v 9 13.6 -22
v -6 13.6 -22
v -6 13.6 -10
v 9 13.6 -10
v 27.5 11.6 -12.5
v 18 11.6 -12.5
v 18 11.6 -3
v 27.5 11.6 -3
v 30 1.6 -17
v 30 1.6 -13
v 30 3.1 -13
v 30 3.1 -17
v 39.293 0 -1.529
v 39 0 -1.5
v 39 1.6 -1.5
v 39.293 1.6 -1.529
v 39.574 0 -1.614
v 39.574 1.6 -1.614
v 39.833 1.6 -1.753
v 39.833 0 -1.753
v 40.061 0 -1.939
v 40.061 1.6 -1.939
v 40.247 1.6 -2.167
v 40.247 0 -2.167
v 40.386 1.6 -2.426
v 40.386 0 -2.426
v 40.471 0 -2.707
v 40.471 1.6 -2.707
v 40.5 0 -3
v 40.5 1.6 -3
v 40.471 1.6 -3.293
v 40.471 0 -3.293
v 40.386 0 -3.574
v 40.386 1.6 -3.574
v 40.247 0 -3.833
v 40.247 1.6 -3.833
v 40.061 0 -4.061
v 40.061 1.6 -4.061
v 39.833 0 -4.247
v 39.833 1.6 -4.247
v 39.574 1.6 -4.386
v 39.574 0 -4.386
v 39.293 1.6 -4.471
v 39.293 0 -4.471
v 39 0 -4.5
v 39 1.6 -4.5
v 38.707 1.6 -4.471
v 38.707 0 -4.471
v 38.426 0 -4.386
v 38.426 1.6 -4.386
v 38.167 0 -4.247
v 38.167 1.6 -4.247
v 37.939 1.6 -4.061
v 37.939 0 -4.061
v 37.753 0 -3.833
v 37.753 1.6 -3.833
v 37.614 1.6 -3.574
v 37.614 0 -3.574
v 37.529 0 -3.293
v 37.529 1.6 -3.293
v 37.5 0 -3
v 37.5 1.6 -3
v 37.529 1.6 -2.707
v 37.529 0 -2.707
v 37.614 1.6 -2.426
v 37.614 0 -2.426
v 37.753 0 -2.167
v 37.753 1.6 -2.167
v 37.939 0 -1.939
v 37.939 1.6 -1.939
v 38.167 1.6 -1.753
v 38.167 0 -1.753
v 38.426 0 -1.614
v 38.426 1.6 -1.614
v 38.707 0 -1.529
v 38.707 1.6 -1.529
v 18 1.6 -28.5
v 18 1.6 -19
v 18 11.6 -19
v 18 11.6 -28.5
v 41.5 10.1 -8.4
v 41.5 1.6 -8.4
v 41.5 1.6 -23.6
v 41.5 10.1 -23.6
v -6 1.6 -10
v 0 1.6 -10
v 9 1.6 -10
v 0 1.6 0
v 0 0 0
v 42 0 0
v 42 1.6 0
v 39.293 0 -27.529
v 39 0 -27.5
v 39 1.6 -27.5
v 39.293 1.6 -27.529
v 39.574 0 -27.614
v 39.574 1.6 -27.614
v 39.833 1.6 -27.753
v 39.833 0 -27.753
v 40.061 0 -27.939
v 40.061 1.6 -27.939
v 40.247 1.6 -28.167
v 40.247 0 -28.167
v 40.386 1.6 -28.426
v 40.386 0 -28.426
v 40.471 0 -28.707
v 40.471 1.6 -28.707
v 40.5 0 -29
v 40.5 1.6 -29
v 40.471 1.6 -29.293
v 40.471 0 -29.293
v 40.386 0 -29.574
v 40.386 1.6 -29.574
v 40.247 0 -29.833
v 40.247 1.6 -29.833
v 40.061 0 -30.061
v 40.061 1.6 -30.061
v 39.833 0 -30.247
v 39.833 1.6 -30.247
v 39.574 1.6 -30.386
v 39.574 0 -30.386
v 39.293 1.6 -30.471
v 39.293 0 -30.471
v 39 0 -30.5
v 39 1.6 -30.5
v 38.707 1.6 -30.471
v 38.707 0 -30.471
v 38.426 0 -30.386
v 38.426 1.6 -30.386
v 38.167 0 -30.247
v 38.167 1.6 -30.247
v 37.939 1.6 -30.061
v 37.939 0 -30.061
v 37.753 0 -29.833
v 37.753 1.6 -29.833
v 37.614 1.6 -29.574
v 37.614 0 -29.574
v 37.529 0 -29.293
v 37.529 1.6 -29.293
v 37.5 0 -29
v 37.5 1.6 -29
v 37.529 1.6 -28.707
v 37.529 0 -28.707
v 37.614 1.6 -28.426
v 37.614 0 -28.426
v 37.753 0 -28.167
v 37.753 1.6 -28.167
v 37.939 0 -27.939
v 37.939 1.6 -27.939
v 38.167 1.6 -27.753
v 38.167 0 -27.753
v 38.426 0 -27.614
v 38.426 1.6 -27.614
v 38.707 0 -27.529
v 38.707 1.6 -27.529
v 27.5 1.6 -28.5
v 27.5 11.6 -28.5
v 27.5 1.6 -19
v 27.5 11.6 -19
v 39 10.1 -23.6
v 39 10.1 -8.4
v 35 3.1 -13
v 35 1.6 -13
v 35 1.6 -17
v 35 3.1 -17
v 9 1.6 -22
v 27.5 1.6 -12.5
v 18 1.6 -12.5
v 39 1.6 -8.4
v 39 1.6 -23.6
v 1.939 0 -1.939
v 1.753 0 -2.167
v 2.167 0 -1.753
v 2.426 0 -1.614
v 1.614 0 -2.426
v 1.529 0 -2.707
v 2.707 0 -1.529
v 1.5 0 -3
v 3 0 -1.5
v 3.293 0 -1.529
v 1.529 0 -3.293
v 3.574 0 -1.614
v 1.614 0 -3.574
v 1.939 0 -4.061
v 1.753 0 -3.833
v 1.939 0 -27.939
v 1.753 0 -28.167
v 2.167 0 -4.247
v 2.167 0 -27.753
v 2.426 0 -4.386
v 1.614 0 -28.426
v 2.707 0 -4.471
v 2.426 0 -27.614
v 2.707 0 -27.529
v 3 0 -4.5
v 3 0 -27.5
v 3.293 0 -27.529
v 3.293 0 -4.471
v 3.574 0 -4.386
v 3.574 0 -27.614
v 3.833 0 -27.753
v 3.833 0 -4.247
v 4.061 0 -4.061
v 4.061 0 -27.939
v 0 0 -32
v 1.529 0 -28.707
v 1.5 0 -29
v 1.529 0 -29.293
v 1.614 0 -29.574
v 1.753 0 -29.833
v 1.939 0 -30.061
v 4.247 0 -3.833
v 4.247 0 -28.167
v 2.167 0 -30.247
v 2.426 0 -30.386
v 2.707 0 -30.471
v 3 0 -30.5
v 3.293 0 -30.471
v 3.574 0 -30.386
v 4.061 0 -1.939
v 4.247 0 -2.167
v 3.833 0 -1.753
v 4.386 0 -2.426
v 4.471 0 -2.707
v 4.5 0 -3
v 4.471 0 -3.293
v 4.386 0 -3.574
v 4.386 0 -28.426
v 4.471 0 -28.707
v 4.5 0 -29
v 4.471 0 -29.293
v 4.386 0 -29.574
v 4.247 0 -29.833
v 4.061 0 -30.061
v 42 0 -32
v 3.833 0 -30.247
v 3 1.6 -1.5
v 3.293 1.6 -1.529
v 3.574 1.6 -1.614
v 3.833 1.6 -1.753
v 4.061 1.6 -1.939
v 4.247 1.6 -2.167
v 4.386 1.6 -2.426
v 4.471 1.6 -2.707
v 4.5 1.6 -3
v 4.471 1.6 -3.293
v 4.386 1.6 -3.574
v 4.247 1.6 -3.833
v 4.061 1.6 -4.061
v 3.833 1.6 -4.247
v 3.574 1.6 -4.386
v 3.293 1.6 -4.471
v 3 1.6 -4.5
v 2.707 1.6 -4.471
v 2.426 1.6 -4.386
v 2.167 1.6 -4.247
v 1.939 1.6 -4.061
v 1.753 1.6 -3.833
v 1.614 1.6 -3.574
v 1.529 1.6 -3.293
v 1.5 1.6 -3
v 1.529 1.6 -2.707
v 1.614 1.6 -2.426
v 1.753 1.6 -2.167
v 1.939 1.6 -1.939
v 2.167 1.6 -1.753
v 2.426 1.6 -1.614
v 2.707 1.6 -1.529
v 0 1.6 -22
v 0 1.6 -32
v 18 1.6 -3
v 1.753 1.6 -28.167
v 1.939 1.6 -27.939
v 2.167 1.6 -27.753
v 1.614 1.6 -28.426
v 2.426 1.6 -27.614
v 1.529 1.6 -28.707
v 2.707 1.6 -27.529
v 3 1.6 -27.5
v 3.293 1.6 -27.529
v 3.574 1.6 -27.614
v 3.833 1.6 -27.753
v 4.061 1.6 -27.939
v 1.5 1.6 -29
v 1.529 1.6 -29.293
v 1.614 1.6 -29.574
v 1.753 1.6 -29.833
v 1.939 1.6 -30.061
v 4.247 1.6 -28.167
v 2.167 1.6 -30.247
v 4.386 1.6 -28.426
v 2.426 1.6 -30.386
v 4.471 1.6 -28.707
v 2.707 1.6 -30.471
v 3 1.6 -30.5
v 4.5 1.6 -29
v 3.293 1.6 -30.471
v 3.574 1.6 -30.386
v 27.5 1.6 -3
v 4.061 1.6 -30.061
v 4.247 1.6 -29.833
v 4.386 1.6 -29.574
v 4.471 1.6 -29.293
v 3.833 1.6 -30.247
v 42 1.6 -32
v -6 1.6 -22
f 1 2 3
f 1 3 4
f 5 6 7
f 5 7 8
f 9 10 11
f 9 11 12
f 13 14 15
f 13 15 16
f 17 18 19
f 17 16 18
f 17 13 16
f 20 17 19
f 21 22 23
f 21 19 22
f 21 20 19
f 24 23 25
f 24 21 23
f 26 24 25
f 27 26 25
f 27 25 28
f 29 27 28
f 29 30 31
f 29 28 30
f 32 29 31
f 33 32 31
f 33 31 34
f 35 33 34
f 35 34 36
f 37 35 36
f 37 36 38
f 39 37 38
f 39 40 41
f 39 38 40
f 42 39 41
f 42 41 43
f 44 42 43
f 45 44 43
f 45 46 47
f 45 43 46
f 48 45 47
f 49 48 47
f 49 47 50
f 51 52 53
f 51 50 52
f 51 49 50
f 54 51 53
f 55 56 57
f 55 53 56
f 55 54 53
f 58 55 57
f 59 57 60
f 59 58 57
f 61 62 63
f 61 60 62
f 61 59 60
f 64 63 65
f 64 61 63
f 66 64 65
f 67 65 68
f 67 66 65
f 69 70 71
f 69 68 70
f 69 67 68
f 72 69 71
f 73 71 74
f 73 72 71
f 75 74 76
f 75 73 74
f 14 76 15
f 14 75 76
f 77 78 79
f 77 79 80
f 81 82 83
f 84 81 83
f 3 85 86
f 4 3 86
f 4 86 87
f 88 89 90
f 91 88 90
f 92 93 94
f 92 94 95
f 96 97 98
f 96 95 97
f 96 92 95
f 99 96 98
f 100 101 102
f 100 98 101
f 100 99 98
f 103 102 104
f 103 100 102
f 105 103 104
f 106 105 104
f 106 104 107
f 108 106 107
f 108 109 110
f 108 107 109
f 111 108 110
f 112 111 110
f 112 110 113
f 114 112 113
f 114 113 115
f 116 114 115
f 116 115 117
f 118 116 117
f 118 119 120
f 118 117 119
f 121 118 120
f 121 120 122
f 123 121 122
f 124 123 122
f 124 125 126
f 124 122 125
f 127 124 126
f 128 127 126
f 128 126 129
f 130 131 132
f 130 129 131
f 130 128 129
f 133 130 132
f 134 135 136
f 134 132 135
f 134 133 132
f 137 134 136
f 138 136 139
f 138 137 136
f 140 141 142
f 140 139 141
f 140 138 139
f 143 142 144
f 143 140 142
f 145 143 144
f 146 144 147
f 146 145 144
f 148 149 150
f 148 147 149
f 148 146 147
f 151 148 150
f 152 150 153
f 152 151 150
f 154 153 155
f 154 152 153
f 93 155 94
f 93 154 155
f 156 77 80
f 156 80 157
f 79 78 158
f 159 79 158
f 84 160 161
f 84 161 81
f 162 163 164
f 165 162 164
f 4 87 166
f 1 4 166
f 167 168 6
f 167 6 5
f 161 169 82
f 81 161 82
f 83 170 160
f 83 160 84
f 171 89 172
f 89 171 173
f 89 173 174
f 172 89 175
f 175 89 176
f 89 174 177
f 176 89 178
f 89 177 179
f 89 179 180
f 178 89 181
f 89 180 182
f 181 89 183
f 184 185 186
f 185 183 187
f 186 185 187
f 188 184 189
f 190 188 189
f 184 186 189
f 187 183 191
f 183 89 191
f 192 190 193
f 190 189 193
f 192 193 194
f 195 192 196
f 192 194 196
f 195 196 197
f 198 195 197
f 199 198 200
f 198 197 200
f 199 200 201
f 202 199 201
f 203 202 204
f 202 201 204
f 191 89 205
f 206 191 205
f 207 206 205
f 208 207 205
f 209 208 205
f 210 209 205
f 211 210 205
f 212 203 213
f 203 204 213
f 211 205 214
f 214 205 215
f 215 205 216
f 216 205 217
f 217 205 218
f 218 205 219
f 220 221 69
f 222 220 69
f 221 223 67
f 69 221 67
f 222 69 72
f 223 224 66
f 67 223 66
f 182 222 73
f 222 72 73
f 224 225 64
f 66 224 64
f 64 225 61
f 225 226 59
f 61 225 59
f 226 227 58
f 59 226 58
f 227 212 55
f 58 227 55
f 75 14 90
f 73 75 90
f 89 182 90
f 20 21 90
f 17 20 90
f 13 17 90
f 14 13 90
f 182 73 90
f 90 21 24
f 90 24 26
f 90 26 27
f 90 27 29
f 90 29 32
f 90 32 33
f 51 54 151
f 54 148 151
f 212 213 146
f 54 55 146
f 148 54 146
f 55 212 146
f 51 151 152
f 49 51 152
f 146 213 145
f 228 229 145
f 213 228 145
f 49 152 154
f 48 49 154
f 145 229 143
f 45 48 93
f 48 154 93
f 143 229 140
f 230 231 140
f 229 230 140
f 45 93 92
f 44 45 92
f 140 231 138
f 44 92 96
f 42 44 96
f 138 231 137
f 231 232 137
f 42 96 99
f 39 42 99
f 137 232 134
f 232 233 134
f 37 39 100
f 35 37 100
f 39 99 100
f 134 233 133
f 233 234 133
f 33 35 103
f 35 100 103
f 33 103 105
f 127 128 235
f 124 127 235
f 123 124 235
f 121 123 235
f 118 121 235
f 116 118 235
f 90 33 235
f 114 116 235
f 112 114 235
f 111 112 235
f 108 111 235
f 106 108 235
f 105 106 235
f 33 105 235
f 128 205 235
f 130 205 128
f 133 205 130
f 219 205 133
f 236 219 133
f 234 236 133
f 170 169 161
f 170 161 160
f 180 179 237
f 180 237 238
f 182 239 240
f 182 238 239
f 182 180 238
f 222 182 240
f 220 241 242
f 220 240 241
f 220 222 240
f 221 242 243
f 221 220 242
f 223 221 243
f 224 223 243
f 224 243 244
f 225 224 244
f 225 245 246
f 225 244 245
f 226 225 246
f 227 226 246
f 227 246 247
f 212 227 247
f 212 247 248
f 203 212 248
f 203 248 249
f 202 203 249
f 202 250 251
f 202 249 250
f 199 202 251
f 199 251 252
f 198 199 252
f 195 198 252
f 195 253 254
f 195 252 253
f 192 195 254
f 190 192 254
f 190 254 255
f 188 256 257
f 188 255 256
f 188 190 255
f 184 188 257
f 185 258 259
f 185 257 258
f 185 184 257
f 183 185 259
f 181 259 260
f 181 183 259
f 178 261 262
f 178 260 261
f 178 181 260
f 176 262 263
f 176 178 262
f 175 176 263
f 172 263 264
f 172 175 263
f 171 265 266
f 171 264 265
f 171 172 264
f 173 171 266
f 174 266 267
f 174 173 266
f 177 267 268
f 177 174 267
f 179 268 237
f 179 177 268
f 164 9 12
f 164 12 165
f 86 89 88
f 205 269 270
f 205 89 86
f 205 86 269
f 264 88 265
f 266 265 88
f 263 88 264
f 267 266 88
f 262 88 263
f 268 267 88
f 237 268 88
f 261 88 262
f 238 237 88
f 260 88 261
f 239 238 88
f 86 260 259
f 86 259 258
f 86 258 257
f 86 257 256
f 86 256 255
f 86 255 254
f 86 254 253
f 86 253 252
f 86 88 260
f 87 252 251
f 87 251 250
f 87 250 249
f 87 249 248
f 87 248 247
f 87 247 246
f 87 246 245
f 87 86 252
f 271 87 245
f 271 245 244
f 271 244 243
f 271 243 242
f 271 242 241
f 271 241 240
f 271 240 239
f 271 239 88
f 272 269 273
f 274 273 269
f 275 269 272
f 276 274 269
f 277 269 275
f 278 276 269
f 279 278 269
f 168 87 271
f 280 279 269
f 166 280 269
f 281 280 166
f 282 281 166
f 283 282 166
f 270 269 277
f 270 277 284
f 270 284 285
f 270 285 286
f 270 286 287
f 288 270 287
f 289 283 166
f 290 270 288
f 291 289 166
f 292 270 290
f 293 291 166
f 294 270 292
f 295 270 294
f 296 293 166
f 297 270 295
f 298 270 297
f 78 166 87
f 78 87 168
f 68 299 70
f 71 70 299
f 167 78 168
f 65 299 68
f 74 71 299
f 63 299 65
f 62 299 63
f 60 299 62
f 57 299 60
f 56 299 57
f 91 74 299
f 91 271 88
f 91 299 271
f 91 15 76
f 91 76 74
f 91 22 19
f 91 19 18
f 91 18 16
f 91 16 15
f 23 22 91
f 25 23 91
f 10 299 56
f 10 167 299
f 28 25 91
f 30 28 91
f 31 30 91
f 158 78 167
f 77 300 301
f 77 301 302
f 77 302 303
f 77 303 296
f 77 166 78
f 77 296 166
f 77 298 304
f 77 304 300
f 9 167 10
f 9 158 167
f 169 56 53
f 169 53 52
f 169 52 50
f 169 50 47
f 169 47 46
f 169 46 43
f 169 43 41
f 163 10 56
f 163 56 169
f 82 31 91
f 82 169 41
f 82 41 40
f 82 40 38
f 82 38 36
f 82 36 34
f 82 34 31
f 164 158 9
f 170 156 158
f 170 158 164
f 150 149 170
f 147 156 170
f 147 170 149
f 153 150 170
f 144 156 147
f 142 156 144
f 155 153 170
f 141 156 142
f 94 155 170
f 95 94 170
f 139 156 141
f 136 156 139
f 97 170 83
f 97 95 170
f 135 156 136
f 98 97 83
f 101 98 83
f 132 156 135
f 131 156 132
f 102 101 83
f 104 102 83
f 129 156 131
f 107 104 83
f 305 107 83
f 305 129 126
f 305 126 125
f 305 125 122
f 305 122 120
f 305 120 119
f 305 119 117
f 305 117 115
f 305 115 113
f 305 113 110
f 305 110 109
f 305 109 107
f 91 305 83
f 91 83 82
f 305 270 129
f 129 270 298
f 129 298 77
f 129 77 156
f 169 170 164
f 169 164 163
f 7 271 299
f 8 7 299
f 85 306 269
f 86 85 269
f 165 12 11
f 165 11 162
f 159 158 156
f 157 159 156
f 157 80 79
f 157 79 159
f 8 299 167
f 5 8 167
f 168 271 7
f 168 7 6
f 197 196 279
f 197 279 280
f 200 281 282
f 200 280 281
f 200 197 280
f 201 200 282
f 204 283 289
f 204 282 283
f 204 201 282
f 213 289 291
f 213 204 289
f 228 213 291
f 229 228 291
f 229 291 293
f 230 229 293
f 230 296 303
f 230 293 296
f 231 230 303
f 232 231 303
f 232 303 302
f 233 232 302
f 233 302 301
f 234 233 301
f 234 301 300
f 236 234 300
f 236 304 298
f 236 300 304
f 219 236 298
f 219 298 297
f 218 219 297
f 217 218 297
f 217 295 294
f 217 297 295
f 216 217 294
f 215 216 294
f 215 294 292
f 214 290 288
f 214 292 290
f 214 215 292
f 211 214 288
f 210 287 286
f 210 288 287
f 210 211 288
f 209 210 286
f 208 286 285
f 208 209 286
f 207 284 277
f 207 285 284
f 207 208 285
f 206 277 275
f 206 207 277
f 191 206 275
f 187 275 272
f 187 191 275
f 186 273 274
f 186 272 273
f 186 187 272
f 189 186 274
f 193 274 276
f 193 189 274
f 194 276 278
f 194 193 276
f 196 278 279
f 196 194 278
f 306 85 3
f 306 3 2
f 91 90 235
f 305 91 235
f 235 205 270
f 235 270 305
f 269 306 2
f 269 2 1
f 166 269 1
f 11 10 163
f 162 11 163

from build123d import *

# Parameters (mm, degrees)
SKETCH1_W               = 42
SKETCH1_H               = 32
PCB_DEPTH               = 1.6
MOUNT_HOLE_1_DEPTH      = 53.825751296
MOUNT_HOLE_1_DEPTH_BACK = 53.825751296
SKETCH2_R               = 1.5
MOUNT_HOLE_2_DEPTH      = 53.825751296
MOUNT_HOLE_2_DEPTH_BACK = 53.825751296
SKETCH3_R               = 1.5
MOUNT_HOLE_3_DEPTH      = 53.825751296
MOUNT_HOLE_3_DEPTH_BACK = 53.825751296
SKETCH4_R               = 1.5
MOUNT_HOLE_4_DEPTH      = 53.825751296
MOUNT_HOLE_4_DEPTH_BACK = 53.825751296
SKETCH5_R               = 1.5
BNC_SOCKET_START        = 1.6
SKETCH6_W               = 15
SKETCH6_H               = 12
BNC_SOCKET_DEPTH        = 12
OFFSET_POT_START        = 1.6
SKETCH7_W               = 9.5
SKETCH7_H               = 9.5
OFFSET_POT_DEPTH        = 10
LIMIT_POT_START         = 1.6
SKETCH8_W               = 9.5
SKETCH8_H               = 9.5
LIMIT_POT_DEPTH         = 10
OP_AMP_START            = 1.6
SKETCH9_W               = 5
SKETCH9_H               = 4
OP_AMP_DEPTH            = 1.5
HEADER_6PIN_START       = 1.6
SKETCH10_W              = 2.5
SKETCH10_H              = 15.2
HEADER_6PIN_DEPTH       = 8.5


with BuildPart() as part:
    # Sketch1 → PCB (new body)
    with BuildSketch(Plane(origin=(0, 0, 0), x_dir=(1, 0, 0), z_dir=(0, 1, 0))):
        with Locations((21, 16)):
            Rectangle(SKETCH1_W, SKETCH1_H)
    extrude(amount=PCB_DEPTH)

    # Sketch2 → Mount_hole_1 (cut, two sides: drawn at the far end of the back side and taken through both)
    with BuildSketch(Plane(origin=(0, 0, 0), x_dir=(1, 0, 0), z_dir=(0, 1, 0)).offset(-MOUNT_HOLE_1_DEPTH_BACK)):
        with Locations(Location((3, 3, 0), (0, 0, 270))):
            Circle(SKETCH2_R)
    extrude(amount=MOUNT_HOLE_1_DEPTH + MOUNT_HOLE_1_DEPTH_BACK, mode=Mode.SUBTRACT)

    # Sketch3 → Mount_hole_2 (cut, two sides: drawn at the far end of the back side and taken through both)
    with BuildSketch(Plane(origin=(0, 0, 0), x_dir=(1, 0, 0), z_dir=(0, 1, 0)).offset(-MOUNT_HOLE_2_DEPTH_BACK)):
        with Locations(Location((39, 3, 0), (0, 0, 270))):
            Circle(SKETCH3_R)
    extrude(amount=MOUNT_HOLE_2_DEPTH + MOUNT_HOLE_2_DEPTH_BACK, mode=Mode.SUBTRACT)

    # Sketch4 → Mount_hole_3 (cut, two sides: drawn at the far end of the back side and taken through both)
    with BuildSketch(Plane(origin=(0, 0, 0), x_dir=(1, 0, 0), z_dir=(0, 1, 0)).offset(-MOUNT_HOLE_3_DEPTH_BACK)):
        with Locations(Location((3, 29, 0), (0, 0, 270))):
            Circle(SKETCH4_R)
    extrude(amount=MOUNT_HOLE_3_DEPTH + MOUNT_HOLE_3_DEPTH_BACK, mode=Mode.SUBTRACT)

    # Sketch5 → Mount_hole_4 (cut, two sides: drawn at the far end of the back side and taken through both)
    with BuildSketch(Plane(origin=(0, 0, 0), x_dir=(1, 0, 0), z_dir=(0, 1, 0)).offset(-MOUNT_HOLE_4_DEPTH_BACK)):
        with Locations(Location((39, 29, 0), (0, 0, 270))):
            Circle(SKETCH5_R)
    extrude(amount=MOUNT_HOLE_4_DEPTH + MOUNT_HOLE_4_DEPTH_BACK, mode=Mode.SUBTRACT)

    # Sketch6 → BNC_socket (add)
    with BuildSketch(Plane(origin=(0, 0, 0), x_dir=(1, 0, 0), z_dir=(0, 1, 0)).offset(BNC_SOCKET_START)):
        with Locations((1.5, 16)):
            Rectangle(SKETCH6_W, SKETCH6_H)
    extrude(amount=BNC_SOCKET_DEPTH)

    # Sketch7 → Offset_pot (add)
    with BuildSketch(Plane(origin=(0, 0, 0), x_dir=(1, 0, 0), z_dir=(0, 1, 0)).offset(OFFSET_POT_START)):
        with Locations((22.75, 7.75)):
            Rectangle(SKETCH7_W, SKETCH7_H)
    extrude(amount=OFFSET_POT_DEPTH)

    # Sketch8 → Limit_pot (add)
    with BuildSketch(Plane(origin=(0, 0, 0), x_dir=(1, 0, 0), z_dir=(0, 1, 0)).offset(LIMIT_POT_START)):
        with Locations((22.75, 23.75)):
            Rectangle(SKETCH8_W, SKETCH8_H)
    extrude(amount=LIMIT_POT_DEPTH)

    # Sketch9 → Op_amp (add)
    with BuildSketch(Plane(origin=(0, 0, 0), x_dir=(1, 0, 0), z_dir=(0, 1, 0)).offset(OP_AMP_START)):
        with Locations((32.5, 15)):
            Rectangle(SKETCH9_W, SKETCH9_H)
    extrude(amount=OP_AMP_DEPTH)

    # Sketch10 → Header_6pin (add)
    with BuildSketch(Plane(origin=(0, 0, 0), x_dir=(1, 0, 0), z_dir=(0, 1, 0)).offset(HEADER_6PIN_START)):
        with Locations((40.25, 16)):
            Rectangle(SKETCH10_W, SKETCH10_H)
    extrude(amount=HEADER_6PIN_DEPTH)


solid = part.part
